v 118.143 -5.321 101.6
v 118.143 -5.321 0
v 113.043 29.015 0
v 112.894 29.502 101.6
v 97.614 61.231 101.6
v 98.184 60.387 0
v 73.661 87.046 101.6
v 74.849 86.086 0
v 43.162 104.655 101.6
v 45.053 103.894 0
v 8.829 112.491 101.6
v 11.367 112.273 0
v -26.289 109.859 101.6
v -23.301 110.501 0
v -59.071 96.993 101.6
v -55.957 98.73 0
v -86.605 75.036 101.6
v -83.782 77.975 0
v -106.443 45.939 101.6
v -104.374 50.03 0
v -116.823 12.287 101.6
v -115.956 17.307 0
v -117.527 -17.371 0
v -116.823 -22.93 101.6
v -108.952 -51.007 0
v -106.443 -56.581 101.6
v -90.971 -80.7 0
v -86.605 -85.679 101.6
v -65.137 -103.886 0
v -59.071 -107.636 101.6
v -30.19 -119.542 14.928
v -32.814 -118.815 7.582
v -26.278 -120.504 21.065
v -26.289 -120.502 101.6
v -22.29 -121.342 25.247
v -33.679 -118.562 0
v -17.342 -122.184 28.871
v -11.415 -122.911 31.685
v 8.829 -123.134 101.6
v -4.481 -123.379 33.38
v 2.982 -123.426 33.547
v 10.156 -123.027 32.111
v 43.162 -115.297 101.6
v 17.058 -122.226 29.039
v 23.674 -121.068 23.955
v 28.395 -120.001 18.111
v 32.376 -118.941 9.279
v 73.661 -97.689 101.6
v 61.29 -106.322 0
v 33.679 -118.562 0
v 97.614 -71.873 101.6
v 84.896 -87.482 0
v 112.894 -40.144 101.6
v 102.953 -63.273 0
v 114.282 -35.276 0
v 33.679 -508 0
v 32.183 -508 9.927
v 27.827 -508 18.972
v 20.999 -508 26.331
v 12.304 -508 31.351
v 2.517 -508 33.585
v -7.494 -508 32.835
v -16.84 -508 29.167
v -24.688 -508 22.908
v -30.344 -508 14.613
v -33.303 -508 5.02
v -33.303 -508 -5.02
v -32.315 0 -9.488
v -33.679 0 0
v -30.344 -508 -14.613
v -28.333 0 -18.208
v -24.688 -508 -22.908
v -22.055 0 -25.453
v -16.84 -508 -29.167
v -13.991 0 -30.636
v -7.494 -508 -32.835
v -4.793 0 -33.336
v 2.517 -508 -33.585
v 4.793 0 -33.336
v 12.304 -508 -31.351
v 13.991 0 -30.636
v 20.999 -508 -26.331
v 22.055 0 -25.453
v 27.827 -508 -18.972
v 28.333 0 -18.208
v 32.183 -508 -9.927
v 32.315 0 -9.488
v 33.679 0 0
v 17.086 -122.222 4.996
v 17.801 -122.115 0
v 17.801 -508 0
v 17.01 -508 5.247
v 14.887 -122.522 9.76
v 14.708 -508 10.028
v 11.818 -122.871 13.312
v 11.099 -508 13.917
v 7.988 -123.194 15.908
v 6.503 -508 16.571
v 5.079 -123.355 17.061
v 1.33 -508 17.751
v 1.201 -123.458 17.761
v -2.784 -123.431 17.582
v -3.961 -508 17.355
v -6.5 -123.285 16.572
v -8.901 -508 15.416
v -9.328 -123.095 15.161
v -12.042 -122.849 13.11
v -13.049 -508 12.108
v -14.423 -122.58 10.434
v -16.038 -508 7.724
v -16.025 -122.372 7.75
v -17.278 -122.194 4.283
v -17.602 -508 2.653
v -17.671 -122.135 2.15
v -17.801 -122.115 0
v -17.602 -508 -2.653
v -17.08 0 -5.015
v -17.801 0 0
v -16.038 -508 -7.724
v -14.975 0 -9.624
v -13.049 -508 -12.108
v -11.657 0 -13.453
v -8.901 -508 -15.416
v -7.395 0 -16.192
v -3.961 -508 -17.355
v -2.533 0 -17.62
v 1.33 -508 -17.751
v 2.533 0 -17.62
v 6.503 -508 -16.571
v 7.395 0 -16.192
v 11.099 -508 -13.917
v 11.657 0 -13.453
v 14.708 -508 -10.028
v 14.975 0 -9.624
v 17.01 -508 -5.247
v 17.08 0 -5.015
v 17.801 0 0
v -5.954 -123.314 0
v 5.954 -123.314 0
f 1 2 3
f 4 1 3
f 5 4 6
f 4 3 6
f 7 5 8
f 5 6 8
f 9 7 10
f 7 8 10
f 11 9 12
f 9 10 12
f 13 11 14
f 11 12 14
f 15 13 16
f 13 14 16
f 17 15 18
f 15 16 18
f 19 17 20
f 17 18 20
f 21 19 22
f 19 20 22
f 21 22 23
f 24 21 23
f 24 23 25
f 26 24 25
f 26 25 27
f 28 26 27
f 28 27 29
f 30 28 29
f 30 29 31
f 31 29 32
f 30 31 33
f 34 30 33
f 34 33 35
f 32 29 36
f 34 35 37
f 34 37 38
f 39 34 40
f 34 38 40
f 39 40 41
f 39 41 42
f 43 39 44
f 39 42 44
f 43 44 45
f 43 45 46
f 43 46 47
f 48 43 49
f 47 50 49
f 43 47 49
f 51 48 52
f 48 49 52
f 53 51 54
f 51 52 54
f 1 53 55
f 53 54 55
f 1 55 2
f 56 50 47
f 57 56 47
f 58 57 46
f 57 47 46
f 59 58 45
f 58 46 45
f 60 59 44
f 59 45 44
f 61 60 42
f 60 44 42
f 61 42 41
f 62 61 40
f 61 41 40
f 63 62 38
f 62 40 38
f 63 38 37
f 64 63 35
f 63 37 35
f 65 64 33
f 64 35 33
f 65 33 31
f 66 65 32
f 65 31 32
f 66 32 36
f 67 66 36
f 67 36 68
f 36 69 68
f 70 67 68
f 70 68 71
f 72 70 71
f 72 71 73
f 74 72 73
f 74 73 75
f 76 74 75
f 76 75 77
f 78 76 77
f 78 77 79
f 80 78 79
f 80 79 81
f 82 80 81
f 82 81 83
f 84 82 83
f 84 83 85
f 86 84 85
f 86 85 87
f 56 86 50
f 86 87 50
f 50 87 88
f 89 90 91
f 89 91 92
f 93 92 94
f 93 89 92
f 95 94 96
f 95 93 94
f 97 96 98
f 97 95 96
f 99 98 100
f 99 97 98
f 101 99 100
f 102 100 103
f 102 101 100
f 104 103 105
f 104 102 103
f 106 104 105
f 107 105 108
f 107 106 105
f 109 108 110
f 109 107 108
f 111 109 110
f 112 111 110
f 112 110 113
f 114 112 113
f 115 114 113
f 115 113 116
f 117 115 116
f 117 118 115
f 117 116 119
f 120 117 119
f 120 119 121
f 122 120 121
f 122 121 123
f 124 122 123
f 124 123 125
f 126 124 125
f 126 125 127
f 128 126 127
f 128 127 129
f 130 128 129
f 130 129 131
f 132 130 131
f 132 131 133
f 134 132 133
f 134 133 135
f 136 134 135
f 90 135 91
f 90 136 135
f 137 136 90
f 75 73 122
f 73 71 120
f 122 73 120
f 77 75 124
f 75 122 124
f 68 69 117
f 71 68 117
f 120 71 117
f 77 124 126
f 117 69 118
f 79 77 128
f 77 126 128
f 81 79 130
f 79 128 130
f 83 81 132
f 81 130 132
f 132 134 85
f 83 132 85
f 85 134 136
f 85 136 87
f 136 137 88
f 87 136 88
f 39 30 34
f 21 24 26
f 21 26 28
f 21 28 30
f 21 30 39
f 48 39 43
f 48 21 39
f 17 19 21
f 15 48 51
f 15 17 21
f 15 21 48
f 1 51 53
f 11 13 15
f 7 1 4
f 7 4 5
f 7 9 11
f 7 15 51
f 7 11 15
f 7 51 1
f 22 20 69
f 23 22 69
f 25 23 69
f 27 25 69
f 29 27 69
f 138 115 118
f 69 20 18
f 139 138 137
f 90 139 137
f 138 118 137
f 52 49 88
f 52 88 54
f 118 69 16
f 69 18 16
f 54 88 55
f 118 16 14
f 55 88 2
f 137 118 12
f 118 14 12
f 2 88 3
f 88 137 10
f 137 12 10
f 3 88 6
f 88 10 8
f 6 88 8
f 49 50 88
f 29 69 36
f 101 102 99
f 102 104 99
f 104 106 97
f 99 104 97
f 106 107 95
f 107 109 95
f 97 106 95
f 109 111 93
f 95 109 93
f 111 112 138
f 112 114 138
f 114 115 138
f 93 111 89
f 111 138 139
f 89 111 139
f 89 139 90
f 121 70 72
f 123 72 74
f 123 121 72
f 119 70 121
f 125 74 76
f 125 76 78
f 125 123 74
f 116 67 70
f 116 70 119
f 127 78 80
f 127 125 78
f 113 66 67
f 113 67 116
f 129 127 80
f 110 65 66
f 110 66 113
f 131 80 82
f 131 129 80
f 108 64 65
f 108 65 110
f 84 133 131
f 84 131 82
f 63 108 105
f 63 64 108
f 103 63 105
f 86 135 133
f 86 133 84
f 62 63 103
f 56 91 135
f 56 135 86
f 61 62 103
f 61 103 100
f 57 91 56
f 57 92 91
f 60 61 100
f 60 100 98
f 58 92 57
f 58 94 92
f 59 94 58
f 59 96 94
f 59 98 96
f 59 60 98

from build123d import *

# Parameters (mm, degrees)
F0_R     = 33.6790507012
F0_R_2   = 17.8010861737
F1_DEPTH = 508
F2_R     = 118.1427595492
F3_DEPTH = 101.6


# Not quite as in the source:
# - the program builds the solid bodies; features that only make, move or delete a surface that nothing else refers to are left out


with BuildPart() as f1:
    # F0 (on Front) → F1 (new body)
    with BuildSketch(Plane.XZ):
        Circle(F0_R)
        Circle(F0_R_2, mode=Mode.SUBTRACT)
    extrude(amount=F1_DEPTH)

    # F2 (on Top) → F3 (join)
    with BuildSketch(Plane.XY):
        with Locations((0, -5.3212568164)):
            Circle(F2_R)
    extrude(amount=F3_DEPTH)


solid = f1.part
